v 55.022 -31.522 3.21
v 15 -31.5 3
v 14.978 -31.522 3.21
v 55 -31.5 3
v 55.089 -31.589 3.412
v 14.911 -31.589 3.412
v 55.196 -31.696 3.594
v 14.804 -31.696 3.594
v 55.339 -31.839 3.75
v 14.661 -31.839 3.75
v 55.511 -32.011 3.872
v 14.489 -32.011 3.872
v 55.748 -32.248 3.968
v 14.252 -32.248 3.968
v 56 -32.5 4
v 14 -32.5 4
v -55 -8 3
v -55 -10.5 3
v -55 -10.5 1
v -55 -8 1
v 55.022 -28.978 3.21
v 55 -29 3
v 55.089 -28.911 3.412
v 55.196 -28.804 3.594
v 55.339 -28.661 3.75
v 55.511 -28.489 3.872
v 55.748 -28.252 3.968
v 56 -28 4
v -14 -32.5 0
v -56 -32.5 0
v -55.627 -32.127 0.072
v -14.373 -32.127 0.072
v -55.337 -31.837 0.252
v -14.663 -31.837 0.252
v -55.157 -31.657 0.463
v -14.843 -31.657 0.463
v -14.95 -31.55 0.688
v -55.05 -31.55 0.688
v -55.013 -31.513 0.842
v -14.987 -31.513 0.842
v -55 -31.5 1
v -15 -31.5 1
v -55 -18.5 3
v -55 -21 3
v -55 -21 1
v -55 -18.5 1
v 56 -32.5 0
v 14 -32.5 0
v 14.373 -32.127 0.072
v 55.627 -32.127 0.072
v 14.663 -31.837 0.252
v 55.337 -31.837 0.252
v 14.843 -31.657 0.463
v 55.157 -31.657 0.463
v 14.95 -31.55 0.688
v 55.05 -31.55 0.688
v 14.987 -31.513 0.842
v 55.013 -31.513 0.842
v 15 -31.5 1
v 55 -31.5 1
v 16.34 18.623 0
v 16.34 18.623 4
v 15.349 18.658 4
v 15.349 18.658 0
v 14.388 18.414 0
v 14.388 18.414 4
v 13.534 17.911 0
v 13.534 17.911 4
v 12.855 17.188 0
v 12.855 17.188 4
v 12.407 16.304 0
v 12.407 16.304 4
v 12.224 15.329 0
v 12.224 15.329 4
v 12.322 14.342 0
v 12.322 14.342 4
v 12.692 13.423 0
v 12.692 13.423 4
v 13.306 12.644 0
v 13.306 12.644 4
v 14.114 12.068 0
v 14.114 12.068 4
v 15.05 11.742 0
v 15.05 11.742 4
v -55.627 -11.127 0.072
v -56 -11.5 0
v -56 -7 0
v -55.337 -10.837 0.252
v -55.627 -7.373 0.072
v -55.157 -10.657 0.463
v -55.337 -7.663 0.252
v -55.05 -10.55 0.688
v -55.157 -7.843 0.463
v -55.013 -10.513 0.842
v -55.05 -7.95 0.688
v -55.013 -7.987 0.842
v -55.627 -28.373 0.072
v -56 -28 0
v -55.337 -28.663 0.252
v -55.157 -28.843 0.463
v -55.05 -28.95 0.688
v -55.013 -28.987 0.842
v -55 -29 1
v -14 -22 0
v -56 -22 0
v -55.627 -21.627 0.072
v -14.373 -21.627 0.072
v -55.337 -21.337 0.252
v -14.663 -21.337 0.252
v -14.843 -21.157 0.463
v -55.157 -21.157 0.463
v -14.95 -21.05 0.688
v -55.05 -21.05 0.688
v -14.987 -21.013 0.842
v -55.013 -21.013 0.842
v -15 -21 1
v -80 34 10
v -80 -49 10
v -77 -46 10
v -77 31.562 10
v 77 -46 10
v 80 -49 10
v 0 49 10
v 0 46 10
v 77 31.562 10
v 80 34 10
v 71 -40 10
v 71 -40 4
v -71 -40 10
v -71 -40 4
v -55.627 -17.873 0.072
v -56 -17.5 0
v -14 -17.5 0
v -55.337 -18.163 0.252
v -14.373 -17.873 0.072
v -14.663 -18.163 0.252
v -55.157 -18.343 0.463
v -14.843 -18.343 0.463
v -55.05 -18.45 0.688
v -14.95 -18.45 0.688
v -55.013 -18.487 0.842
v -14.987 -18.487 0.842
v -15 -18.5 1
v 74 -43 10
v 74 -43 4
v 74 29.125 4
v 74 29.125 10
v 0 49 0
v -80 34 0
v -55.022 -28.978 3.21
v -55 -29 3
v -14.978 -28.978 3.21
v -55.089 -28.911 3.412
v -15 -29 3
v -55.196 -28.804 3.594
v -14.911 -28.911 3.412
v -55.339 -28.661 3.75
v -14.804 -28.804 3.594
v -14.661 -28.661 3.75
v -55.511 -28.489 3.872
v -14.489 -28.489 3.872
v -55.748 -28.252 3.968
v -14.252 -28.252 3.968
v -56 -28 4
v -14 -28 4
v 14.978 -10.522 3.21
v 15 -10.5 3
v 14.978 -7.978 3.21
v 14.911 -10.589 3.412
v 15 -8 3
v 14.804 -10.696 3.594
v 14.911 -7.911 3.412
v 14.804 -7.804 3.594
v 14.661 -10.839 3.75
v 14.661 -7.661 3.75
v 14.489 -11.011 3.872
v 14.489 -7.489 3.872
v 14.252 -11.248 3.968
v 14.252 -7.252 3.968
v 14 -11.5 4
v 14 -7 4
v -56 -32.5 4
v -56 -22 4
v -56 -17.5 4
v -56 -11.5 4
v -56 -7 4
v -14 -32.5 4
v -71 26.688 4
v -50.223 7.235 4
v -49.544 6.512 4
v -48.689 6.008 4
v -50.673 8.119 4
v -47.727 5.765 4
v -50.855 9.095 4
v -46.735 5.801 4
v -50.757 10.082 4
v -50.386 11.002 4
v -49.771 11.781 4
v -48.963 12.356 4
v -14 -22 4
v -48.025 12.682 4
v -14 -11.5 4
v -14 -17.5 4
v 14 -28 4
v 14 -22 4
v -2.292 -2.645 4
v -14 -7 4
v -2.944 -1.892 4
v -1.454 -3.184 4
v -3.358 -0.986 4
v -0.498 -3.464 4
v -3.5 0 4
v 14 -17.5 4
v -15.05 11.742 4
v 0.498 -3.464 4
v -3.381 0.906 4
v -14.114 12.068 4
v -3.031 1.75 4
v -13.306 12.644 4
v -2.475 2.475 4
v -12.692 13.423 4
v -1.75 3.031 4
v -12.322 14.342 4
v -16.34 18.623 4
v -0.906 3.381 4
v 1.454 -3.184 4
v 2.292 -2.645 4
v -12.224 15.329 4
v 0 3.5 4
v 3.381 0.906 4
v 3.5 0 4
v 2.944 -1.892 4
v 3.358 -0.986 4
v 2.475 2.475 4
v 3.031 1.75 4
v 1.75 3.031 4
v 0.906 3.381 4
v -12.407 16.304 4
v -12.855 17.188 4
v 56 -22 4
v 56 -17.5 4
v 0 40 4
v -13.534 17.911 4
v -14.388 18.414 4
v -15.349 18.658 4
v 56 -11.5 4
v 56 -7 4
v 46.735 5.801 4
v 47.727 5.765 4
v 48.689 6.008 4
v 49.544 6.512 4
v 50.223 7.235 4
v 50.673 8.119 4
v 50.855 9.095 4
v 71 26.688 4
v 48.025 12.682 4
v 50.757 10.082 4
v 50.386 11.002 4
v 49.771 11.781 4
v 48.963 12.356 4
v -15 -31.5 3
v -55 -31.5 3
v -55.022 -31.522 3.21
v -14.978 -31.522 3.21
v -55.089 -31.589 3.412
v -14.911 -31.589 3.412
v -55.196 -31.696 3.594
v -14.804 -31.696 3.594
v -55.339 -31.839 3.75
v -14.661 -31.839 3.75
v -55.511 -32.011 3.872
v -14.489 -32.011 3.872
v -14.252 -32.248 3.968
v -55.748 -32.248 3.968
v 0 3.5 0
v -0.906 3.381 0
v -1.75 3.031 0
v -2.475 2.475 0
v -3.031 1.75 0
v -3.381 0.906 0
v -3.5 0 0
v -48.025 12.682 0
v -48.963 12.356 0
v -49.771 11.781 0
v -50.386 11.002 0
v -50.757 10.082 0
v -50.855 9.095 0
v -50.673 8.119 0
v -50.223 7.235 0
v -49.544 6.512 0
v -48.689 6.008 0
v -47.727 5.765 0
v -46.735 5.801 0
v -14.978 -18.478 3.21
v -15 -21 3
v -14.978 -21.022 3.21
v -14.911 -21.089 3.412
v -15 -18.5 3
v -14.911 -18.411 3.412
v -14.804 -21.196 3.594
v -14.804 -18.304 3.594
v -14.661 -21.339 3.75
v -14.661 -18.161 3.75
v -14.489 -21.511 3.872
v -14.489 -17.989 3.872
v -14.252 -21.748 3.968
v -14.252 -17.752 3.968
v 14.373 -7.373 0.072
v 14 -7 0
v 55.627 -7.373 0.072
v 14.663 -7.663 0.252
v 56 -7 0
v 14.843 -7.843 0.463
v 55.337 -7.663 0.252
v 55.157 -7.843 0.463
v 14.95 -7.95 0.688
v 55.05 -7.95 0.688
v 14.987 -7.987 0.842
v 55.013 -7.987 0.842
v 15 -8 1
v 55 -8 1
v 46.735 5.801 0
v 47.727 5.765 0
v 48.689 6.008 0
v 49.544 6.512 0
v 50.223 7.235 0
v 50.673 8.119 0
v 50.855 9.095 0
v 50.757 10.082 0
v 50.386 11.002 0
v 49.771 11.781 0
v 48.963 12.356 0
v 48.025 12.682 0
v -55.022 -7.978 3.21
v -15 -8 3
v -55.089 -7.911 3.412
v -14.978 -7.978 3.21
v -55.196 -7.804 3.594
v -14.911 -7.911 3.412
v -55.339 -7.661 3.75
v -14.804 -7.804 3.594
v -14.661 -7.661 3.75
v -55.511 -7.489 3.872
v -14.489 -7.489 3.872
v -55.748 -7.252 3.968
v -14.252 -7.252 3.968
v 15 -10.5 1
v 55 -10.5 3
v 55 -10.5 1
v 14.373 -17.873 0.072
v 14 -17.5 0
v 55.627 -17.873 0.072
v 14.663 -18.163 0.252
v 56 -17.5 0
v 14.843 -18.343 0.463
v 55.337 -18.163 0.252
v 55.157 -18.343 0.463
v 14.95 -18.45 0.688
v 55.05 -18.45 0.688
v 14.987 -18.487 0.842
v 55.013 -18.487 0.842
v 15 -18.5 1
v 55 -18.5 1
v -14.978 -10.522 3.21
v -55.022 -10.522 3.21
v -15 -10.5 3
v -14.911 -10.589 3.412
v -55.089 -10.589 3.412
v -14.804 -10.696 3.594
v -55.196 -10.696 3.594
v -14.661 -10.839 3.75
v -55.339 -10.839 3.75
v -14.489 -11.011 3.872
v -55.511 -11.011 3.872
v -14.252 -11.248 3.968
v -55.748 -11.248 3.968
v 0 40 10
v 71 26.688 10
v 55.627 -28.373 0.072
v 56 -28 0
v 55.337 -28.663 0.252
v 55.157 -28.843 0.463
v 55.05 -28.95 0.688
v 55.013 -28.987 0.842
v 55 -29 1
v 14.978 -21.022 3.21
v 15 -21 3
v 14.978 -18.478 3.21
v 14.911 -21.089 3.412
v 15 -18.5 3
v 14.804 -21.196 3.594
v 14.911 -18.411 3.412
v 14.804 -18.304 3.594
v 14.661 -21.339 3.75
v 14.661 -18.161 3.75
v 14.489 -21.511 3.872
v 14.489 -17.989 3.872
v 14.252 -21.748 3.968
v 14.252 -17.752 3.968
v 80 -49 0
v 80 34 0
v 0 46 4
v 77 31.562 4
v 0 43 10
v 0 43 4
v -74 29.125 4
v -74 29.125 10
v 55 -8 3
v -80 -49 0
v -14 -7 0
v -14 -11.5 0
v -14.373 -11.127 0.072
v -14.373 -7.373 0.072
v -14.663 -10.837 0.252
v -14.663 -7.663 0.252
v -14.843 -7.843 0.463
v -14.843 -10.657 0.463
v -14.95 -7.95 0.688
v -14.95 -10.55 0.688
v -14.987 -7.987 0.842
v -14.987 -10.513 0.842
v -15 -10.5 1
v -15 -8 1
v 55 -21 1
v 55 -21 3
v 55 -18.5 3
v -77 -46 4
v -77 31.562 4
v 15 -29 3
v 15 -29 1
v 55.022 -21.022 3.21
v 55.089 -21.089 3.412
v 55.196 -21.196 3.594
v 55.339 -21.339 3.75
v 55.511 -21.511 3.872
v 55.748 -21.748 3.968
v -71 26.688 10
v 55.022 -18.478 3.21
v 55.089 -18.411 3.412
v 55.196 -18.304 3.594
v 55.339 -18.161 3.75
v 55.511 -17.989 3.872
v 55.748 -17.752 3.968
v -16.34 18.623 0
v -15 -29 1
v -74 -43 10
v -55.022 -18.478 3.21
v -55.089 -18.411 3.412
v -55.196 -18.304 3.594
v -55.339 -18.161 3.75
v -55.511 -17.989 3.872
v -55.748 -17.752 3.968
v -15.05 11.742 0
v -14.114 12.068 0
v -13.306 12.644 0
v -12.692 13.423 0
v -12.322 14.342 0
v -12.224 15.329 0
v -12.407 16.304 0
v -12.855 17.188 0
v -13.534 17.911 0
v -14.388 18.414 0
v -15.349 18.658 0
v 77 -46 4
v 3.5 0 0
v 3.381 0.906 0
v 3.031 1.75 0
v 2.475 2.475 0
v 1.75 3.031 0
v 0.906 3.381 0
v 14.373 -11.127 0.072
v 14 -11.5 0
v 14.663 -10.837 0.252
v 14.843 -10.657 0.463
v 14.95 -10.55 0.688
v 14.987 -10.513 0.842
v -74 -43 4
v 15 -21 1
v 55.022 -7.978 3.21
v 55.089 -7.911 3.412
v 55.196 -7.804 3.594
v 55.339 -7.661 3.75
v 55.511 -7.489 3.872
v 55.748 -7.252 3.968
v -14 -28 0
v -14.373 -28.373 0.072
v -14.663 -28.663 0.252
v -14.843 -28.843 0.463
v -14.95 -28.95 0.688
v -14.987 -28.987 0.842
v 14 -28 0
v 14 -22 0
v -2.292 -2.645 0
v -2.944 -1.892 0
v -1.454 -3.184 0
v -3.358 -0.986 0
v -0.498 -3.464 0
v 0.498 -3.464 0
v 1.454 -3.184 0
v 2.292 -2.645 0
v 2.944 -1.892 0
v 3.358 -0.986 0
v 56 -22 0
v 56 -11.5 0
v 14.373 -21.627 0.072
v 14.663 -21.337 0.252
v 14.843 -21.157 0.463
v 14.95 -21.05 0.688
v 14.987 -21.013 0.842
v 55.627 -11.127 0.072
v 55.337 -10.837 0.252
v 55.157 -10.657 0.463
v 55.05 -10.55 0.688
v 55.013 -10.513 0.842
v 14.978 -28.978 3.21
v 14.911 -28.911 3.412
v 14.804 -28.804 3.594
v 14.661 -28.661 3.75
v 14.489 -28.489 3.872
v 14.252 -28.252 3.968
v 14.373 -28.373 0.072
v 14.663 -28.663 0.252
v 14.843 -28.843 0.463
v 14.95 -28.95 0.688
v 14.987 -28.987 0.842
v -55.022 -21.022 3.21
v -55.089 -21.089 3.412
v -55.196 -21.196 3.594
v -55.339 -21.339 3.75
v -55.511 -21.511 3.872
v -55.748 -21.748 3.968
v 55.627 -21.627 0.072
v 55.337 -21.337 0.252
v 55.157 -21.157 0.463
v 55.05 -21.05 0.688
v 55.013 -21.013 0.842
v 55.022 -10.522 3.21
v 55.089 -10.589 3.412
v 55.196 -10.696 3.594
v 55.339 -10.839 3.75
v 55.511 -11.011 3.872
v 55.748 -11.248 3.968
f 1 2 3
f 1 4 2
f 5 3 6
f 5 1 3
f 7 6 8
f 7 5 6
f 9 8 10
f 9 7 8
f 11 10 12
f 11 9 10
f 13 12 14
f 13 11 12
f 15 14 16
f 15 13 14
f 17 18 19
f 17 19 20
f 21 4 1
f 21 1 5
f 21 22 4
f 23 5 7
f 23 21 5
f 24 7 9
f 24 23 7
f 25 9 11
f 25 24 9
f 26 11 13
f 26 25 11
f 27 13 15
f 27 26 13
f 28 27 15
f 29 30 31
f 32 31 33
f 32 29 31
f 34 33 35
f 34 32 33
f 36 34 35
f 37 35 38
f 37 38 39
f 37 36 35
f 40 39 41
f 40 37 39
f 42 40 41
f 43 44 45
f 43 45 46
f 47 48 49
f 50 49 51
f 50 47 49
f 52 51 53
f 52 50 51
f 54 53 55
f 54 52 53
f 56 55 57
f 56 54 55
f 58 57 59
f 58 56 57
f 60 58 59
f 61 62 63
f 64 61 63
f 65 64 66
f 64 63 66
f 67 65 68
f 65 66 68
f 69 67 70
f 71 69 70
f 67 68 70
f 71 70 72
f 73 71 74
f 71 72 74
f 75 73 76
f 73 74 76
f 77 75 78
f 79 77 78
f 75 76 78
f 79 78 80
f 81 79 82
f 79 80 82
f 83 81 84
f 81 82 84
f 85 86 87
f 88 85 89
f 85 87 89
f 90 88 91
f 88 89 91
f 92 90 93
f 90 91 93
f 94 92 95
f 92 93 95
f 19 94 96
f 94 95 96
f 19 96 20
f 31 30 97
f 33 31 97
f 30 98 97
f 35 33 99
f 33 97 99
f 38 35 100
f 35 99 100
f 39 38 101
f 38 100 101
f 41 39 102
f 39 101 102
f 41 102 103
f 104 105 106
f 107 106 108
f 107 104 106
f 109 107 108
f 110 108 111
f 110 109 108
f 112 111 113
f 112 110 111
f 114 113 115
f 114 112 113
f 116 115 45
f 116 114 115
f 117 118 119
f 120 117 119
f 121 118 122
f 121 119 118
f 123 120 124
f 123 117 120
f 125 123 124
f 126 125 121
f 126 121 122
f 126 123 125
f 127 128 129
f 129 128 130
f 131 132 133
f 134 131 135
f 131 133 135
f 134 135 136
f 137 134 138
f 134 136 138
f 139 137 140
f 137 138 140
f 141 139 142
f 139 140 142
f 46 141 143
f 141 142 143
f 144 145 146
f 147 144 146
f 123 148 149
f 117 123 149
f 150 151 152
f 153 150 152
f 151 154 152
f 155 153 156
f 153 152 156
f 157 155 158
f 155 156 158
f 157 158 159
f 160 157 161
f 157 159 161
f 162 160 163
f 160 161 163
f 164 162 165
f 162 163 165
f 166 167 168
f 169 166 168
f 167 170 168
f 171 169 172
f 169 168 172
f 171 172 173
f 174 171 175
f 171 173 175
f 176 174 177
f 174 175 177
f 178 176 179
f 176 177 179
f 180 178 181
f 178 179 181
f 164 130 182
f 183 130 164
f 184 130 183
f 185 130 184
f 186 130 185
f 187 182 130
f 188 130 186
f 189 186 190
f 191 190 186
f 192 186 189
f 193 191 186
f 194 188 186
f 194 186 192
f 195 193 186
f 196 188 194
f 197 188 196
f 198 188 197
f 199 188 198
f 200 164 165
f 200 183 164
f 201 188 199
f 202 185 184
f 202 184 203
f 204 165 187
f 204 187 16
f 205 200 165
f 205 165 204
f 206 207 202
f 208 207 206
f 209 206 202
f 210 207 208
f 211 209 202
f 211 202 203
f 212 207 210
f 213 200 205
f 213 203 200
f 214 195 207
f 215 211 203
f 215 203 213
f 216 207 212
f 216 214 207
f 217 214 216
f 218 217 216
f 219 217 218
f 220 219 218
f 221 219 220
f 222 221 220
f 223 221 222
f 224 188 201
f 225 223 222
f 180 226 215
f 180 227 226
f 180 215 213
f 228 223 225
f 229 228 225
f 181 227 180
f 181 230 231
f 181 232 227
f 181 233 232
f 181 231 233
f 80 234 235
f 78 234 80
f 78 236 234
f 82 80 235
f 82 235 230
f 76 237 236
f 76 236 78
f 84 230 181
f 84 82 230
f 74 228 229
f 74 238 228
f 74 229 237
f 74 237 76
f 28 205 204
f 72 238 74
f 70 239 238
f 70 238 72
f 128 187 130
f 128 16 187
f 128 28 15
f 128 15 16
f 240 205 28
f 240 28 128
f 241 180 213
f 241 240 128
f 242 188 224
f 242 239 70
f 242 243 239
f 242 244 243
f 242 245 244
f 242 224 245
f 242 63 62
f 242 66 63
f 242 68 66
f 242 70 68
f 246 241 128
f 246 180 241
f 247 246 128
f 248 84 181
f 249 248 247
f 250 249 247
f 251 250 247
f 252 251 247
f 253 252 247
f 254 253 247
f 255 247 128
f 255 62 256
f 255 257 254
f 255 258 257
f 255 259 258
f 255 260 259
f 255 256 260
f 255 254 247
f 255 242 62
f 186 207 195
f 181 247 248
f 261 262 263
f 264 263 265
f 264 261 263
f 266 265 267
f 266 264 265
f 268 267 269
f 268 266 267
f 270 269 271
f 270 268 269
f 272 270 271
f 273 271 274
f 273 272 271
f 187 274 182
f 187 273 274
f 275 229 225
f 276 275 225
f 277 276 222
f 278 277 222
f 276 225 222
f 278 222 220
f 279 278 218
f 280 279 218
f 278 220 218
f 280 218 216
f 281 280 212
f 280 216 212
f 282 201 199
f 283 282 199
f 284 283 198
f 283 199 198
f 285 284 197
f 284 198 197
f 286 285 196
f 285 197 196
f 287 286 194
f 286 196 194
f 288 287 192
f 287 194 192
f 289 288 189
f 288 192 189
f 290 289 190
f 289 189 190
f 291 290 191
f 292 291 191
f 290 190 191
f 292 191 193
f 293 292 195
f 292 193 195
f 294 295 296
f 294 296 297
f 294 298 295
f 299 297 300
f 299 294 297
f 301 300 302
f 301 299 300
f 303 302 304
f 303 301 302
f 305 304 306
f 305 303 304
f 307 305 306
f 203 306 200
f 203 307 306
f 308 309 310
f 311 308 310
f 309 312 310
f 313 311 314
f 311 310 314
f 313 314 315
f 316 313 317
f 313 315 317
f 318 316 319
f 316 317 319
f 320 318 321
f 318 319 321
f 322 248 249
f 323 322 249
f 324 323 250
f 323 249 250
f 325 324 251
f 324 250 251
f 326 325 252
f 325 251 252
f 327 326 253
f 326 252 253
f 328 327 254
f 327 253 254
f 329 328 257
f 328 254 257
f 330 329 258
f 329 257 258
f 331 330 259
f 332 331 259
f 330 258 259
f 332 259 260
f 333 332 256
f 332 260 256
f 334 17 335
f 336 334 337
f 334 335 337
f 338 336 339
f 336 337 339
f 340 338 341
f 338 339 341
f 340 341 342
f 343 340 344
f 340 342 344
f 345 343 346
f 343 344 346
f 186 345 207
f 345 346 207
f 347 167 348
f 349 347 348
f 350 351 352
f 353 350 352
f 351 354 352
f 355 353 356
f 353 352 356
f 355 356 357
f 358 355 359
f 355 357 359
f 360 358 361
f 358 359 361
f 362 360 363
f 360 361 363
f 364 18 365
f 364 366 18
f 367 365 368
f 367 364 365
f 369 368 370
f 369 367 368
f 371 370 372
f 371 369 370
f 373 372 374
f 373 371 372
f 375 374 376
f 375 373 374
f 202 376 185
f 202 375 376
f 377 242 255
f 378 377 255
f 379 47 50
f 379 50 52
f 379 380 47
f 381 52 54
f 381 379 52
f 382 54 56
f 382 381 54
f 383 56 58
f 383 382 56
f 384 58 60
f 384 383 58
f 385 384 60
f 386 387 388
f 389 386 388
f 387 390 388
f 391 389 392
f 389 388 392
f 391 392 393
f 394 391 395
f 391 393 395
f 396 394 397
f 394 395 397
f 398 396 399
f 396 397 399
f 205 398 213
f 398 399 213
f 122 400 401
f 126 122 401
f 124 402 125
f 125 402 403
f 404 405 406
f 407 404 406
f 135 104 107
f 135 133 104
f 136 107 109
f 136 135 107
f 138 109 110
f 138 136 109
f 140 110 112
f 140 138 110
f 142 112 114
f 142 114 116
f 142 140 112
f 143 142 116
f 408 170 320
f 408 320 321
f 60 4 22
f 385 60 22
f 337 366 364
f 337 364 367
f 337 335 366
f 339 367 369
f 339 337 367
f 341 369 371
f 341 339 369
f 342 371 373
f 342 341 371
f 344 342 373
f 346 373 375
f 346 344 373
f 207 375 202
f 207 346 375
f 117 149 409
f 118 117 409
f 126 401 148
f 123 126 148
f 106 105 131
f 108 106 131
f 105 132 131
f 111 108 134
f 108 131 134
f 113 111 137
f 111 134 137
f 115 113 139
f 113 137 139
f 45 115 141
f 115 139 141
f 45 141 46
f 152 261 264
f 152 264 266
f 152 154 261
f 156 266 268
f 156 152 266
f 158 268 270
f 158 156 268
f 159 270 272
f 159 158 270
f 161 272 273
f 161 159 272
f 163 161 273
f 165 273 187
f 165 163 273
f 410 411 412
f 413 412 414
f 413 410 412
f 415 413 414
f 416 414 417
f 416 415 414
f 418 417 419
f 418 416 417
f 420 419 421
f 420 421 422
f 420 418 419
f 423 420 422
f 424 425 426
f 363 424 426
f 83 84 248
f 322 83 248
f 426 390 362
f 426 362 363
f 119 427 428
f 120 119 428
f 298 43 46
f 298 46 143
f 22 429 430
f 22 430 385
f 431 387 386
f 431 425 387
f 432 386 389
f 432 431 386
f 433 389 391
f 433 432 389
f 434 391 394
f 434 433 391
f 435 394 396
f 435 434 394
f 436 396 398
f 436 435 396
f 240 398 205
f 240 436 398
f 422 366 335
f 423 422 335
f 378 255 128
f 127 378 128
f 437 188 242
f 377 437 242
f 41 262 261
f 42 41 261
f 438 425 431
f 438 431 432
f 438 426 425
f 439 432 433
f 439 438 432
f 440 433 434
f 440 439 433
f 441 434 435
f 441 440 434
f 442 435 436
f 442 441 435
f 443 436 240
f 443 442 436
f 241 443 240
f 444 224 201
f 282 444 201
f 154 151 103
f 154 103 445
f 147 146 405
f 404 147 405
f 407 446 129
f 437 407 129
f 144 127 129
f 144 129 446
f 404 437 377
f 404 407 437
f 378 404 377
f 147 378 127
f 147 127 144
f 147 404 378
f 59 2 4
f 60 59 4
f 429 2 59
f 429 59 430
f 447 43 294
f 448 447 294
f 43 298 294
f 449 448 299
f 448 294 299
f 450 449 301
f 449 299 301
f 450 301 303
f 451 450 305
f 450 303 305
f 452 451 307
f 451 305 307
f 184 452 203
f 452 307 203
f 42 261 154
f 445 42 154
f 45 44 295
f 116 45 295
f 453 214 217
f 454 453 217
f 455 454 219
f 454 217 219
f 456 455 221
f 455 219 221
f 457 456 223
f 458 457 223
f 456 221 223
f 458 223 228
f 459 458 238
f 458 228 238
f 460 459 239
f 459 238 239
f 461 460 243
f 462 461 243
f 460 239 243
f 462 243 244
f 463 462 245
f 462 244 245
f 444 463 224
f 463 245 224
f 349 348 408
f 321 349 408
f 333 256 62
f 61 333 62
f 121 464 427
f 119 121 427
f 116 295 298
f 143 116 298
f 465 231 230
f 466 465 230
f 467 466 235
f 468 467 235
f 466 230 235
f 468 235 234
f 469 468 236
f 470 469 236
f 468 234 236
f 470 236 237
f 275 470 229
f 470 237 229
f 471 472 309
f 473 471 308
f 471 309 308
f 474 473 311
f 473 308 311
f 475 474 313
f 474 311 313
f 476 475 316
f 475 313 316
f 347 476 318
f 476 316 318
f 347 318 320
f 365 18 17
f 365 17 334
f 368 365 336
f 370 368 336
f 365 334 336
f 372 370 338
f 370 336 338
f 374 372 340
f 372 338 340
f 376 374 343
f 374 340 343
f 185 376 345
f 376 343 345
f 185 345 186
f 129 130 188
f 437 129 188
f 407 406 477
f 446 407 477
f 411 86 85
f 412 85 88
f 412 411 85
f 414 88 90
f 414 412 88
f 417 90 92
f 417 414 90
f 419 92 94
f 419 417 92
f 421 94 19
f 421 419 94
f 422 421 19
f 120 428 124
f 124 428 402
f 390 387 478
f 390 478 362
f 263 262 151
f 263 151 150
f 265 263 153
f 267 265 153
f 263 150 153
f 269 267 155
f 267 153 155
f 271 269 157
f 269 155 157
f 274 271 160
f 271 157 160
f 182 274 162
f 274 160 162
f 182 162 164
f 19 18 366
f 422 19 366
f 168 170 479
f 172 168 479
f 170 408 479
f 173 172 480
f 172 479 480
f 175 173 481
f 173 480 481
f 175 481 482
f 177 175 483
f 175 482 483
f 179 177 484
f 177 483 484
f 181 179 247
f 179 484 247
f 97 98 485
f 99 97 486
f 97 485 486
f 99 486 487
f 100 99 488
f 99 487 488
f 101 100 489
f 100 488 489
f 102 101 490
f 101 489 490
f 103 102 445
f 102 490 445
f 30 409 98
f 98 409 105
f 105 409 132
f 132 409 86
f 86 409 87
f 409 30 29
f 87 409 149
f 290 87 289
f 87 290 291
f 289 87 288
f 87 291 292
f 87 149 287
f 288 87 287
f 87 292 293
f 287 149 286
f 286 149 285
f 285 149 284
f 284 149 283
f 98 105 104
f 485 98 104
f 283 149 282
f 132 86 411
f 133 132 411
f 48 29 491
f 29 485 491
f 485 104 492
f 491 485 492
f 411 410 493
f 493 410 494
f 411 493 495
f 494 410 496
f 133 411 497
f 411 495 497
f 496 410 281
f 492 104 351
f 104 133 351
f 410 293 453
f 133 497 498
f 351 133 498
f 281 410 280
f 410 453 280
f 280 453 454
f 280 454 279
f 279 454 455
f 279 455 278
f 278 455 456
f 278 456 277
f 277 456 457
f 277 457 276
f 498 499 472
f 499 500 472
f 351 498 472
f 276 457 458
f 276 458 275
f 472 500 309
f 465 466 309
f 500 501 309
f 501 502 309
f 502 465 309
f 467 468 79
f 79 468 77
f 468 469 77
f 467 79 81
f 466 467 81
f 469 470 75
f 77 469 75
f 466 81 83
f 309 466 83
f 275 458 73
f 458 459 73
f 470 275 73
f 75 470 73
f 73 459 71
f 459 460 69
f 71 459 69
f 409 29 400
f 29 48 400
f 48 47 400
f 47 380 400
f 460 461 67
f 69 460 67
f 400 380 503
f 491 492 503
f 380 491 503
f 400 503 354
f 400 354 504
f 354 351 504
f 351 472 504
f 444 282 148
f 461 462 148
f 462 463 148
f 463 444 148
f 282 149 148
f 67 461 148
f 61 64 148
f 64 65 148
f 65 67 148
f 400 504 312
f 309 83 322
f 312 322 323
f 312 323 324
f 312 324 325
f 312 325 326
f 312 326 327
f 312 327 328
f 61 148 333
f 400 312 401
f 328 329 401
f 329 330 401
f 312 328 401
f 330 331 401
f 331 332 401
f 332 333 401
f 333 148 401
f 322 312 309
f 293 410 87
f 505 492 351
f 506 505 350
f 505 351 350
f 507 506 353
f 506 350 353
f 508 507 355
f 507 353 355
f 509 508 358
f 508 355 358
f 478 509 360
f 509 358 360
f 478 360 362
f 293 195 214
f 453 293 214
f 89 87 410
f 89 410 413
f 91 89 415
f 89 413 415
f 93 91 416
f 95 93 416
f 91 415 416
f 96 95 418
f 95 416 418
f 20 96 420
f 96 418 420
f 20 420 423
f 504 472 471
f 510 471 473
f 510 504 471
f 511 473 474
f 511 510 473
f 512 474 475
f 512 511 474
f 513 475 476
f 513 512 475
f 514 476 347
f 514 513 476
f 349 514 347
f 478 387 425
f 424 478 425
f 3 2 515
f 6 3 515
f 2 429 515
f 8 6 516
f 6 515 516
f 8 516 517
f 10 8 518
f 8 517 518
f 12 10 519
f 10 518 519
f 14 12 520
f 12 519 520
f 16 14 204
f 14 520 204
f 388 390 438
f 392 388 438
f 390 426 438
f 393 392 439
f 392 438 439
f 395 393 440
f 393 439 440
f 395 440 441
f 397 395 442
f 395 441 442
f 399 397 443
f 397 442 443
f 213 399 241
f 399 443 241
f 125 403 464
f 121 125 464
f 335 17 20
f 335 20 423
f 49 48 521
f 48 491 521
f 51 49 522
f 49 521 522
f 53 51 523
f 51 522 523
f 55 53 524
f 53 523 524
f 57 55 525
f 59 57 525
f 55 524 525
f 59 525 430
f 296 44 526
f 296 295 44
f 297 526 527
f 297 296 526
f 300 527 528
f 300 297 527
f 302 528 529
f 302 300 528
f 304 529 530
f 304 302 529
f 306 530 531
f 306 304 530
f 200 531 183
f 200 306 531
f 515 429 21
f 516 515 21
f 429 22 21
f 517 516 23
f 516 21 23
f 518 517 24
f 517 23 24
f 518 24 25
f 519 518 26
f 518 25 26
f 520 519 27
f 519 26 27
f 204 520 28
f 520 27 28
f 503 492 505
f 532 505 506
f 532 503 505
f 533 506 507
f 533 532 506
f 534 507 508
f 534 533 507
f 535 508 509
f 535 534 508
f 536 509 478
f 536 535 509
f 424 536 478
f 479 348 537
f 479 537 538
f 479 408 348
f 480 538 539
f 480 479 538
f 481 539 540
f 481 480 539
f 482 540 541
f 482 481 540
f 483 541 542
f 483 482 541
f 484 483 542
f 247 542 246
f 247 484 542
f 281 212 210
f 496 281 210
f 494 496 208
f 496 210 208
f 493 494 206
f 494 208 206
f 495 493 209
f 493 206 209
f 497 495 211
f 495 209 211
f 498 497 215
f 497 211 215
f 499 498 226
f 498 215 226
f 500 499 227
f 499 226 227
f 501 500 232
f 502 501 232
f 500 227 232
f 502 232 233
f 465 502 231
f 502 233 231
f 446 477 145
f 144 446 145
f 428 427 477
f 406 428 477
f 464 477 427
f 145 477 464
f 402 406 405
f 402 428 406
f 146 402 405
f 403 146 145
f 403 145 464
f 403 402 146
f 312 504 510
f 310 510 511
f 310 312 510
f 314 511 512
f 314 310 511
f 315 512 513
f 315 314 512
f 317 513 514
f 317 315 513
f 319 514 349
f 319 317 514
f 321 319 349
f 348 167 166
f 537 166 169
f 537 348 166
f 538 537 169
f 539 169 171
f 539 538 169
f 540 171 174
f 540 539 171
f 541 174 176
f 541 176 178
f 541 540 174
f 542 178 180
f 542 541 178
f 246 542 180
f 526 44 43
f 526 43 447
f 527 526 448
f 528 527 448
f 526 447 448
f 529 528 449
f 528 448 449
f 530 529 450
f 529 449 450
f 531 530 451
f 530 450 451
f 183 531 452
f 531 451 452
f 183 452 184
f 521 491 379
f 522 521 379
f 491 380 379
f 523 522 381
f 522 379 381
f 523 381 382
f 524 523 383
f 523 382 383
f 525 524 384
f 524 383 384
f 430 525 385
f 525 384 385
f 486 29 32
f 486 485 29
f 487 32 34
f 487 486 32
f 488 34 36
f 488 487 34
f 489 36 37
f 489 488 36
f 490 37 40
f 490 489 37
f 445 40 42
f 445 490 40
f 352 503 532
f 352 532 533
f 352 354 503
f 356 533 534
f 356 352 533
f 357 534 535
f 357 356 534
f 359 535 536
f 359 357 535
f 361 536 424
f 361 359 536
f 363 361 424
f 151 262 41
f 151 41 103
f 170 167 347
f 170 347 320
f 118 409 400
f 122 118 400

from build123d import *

# Parameters (mm, degrees)
F1_DEPTH = 4
F2_DEPTH = 10
F4_DEPTH = 25
F5_DEPTH = 5
F6_W     = 40
F6_H     = 2.5
F7_DEPTH = 25
F8_R     = 1


with BuildPart() as f1:
    # F0 (on Top) → F1 (new body)
    with BuildSketch(Plane.XY):
        Polygon((71, -40), (71, 26.6875), (0, 40), (-71, 26.6875), (-71, -40), align=None)
        Polygon((77, -46), (77, 25.5625), (74, 26.125), (74, -43), (-74, -43), (-74, 26.125), (-77, 25.5625), (-77, -46), align=None)
        Polygon((0, 43), (71, 29.6875), (71, 32.6875), (0, 46), (-71, 32.6875), (-71, 29.6875), align=None)
        Polygon((-80, -49), (80, -49), (80, 25), (77, 25.5625), (77, -46), (-77, -46), (-77, 25.5625), (-80, 25), align=None)
        Polygon((74, -43), (74, 26.125), (71, 26.6875), (71, -40), (-71, -40), (-71, 26.6875), (-74, 26.125), (-74, -43), align=None)
        Polygon((-80, 31), (-80, 28), (-77, 28.5625), (-77, 31.5625), align=None)
        Polygon((-80, 34), (-80, 31), (-77, 31.5625), (-77, 34.5625), align=None)
        Polygon((-80, 28), (-80, 25), (-77, 25.5625), (-77, 28.5625), align=None)
        Polygon((-77, 34.5625), (-77, 31.5625), (-74, 32.125), (-74, 35.125), align=None)
        Polygon((-77, 31.5625), (-77, 28.5625), (-74, 29.125), (-74, 32.125), align=None)
        Polygon((-77, 28.5625), (-77, 25.5625), (-74, 26.125), (-74, 29.125), align=None)
        Polygon((-74, 32.125), (-74, 29.125), (-71, 29.6875), (-71, 32.6875), align=None)
        Polygon((-74, 29.125), (-74, 26.125), (-71, 26.6875), (-71, 29.6875), align=None)
        Polygon((-74, 35.125), (-74, 32.125), (-71, 32.6875), (-71, 35.6875), align=None)
        Polygon((0, 46), (71, 32.6875), (71, 35.6875), (0, 49), (-71, 35.6875), (-71, 32.6875), align=None)
        Polygon((0, 40), (71, 26.6875), (71, 29.6875), (0, 43), (-71, 29.6875), (-71, 26.6875), align=None)
        Polygon((71, 32.6875), (74, 32.125), (74, 35.125), (71, 35.6875), align=None)
        Polygon((74, 32.125), (77, 31.5625), (77, 34.5625), (74, 35.125), align=None)
        Polygon((77, 31.5625), (80, 31), (80, 34), (77, 34.5625), align=None)
        Polygon((77, 28.5625), (80, 28), (80, 31), (77, 31.5625), align=None)
        Polygon((77, 25.5625), (80, 25), (80, 28), (77, 28.5625), align=None)
        Polygon((74, 26.125), (77, 25.5625), (77, 28.5625), (74, 29.125), align=None)
        Polygon((71, 26.6875), (74, 26.125), (74, 29.125), (71, 29.6875), align=None)
        Polygon((71, 29.6875), (74, 29.125), (74, 32.125), (71, 32.6875), align=None)
        Polygon((74, 29.125), (77, 28.5625), (77, 31.5625), (74, 32.125), align=None)
    extrude(amount=F1_DEPTH)

    # F0 (on Top) → F2 (join)
    with BuildSketch(Plane.XY):
        Polygon((77, 31.5625), (80, 31), (80, 34), (77, 34.5625), align=None)
        Polygon((74, 32.125), (77, 31.5625), (77, 34.5625), (74, 35.125), align=None)
        Polygon((71, 32.6875), (74, 32.125), (74, 35.125), (71, 35.6875), align=None)
        Polygon((0, 46), (71, 32.6875), (71, 35.6875), (0, 49), (-71, 35.6875), (-71, 32.6875), align=None)
        Polygon((-74, 35.125), (-74, 32.125), (-71, 32.6875), (-71, 35.6875), align=None)
        Polygon((-77, 34.5625), (-77, 31.5625), (-74, 32.125), (-74, 35.125), align=None)
        Polygon((-80, 34), (-80, 31), (-77, 31.5625), (-77, 34.5625), align=None)
        Polygon((-80, 28), (-80, 25), (-77, 25.5625), (-77, 28.5625), align=None)
        Polygon((-74, 29.125), (-74, 26.125), (-71, 26.6875), (-71, 29.6875), align=None)
        Polygon((0, 40), (71, 26.6875), (71, 29.6875), (0, 43), (-71, 29.6875), (-71, 26.6875), align=None)
        Polygon((77, 25.5625), (80, 25), (80, 28), (77, 28.5625), align=None)
        Polygon((71, 26.6875), (74, 26.125), (74, 29.125), (71, 29.6875), align=None)
        Polygon((-80, -49), (80, -49), (80, 25), (77, 25.5625), (77, -46), (-77, -46), (-77, 25.5625), (-80, 25), align=None)
        Polygon((74, -43), (74, 26.125), (71, 26.6875), (71, -40), (-71, -40), (-71, 26.6875), (-74, 26.125), (-74, -43), align=None)
        Polygon((-80, 31), (-80, 28), (-77, 28.5625), (-77, 31.5625), align=None)
        Polygon((77, 28.5625), (80, 28), (80, 31), (77, 31.5625), align=None)
    extrude(amount=F2_DEPTH)

    # F3 (on face) → F4 (cut)
    with BuildSketch(Plane.XY.offset(4)):
        with BuildLine():
            Line((-3.5, 0), (0, 0))
            Line((0, 0), (0, 3.5))
            ThreePointArc((0, 3.5), (-2.4748737342, 2.4748737342), (-3.5, 0))
        make_face()
        with BuildLine():
            Line((0, 3.5), (0, 0))
            Line((0, 0), (-3.5, 0))
            ThreePointArc((-3.5, 0), (0, -3.5), (3.5, 0))
            ThreePointArc((3.5, 0), (2.4748737342, 2.4748737342), (0, 3.5))
        make_face()
    extrude(amount=-F4_DEPTH, mode=Mode.SUBTRACT)

    # F3 (on face) → F5 (cut)
    with BuildSketch(Plane.XY.offset(4)):
        with BuildLine():
            ThreePointArc((-48.0253626304, 12.6815713362), (-50.7987183194, 8.6005751391), (-46.7353428851, 5.8014660276))
            Line((-46.7353428851, 5.8014660276), (-48.0253626304, 12.6815713362))
        make_face()
        Polygon((-46.7353428851, 5.8014660276), (-15.0502303624, 11.7424246256), (-16.3402501078, 18.6225299342), (-48.0253626304, 12.6815713362), align=None)
        with BuildLine():
            Line((-16.3402501078, 18.6225299342), (-15.0502303624, 11.7424246256))
            ThreePointArc((-15.0502303624, 11.7424246256), (-12.2805111805, 15.8227389776), (-16.3402501078, 18.6225299342))
        make_face()
        with BuildLine():
            ThreePointArc((16.3402501078, 18.6225299342), (12.2805111805, 15.8227389776), (15.0502303624, 11.7424246256))
            Line((15.0502303624, 11.7424246256), (46.7353428851, 5.8014660276))
            ThreePointArc((46.7353428851, 5.8014660276), (50.7987183194, 8.6005751391), (48.0253626304, 12.6815713362))
            Line((48.0253626304, 12.6815713362), (16.3402501078, 18.6225299342))
        make_face()
    extrude(amount=-F5_DEPTH, mode=Mode.SUBTRACT)

    # F6 (on face) → F7 (cut)
    with BuildSketch(Plane.XY.offset(4)):
        with Locations((-35, -30.25)):
            Rectangle(F6_W, F6_H)
        with Locations((-35, -19.75)):
            Rectangle(F6_W, F6_H)
        with Locations((35, -19.75)):
            Rectangle(F6_W, F6_H)
        with Locations((35, -30.25)):
            Rectangle(F6_W, F6_H)
        with Locations((-35, -9.25)):
            Rectangle(F6_W, F6_H)
        with Locations((35, -9.25)):
            Rectangle(F6_W, F6_H)
    extrude(amount=-F7_DEPTH, mode=Mode.SUBTRACT)

    # F8
    f8_edges = [f1.edges().sort_by_distance(p)[0] for p in [
        (-35, -31.5, 4),
        (-35, -29, 4),
        (-35, -21, 4),
        (-35, -18.5, 4),
        (-35, -10.5, 4),
        (-35, -8, 4),
        (-55, -9.25, 4),
        (-55, -19.75, 4),
        (-55, -30.25, 4),
        (-15, -30.25, 4),
        (-15, -19.75, 4),
        (-15, -9.25, 4),
        (15, -9.25, 4),
        (15, -19.75, 4),
        (15, -30.25, 4),
        (35, -29, 4),
        (35, -31.5, 4),
        (35, -18.5, 4),
        (15, -9.25, 0),
        (15, -19.75, 0),
        (35, -31.5, 0),
        (15, -30.25, 0),
        (35, -29, 0),
        (35, -21, 0),
        (35, -18.5, 0),
        (35, -8, 0),
        (35, -10.5, 0),
        (55, -30.25, 0),
        (55, -19.75, 0),
        (55, -9.25, 0),
        (-15, -30.25, 0),
        (-15, -19.75, 0),
        (-55, -30.25, 0),
        (-55, -19.75, 0),
        (-55, -9.25, 0),
        (-35, -21, 0),
        (-35, -29, 0),
        (-35, -31.5, 0),
        (-35, -10.5, 0),
        (-35, -8, 0),
        (-35, -18.5, 0),
        (-15, -9.25, 0),
        (55, -30.25, 4),
        (55, -19.75, 4),
        (35, -21, 4),
        (35, -10.5, 4),
        (35, -8, 4),
        (55, -9.25, 4),
    ]]
    fillet(f8_edges, radius=F8_R)


solid = f1.part
